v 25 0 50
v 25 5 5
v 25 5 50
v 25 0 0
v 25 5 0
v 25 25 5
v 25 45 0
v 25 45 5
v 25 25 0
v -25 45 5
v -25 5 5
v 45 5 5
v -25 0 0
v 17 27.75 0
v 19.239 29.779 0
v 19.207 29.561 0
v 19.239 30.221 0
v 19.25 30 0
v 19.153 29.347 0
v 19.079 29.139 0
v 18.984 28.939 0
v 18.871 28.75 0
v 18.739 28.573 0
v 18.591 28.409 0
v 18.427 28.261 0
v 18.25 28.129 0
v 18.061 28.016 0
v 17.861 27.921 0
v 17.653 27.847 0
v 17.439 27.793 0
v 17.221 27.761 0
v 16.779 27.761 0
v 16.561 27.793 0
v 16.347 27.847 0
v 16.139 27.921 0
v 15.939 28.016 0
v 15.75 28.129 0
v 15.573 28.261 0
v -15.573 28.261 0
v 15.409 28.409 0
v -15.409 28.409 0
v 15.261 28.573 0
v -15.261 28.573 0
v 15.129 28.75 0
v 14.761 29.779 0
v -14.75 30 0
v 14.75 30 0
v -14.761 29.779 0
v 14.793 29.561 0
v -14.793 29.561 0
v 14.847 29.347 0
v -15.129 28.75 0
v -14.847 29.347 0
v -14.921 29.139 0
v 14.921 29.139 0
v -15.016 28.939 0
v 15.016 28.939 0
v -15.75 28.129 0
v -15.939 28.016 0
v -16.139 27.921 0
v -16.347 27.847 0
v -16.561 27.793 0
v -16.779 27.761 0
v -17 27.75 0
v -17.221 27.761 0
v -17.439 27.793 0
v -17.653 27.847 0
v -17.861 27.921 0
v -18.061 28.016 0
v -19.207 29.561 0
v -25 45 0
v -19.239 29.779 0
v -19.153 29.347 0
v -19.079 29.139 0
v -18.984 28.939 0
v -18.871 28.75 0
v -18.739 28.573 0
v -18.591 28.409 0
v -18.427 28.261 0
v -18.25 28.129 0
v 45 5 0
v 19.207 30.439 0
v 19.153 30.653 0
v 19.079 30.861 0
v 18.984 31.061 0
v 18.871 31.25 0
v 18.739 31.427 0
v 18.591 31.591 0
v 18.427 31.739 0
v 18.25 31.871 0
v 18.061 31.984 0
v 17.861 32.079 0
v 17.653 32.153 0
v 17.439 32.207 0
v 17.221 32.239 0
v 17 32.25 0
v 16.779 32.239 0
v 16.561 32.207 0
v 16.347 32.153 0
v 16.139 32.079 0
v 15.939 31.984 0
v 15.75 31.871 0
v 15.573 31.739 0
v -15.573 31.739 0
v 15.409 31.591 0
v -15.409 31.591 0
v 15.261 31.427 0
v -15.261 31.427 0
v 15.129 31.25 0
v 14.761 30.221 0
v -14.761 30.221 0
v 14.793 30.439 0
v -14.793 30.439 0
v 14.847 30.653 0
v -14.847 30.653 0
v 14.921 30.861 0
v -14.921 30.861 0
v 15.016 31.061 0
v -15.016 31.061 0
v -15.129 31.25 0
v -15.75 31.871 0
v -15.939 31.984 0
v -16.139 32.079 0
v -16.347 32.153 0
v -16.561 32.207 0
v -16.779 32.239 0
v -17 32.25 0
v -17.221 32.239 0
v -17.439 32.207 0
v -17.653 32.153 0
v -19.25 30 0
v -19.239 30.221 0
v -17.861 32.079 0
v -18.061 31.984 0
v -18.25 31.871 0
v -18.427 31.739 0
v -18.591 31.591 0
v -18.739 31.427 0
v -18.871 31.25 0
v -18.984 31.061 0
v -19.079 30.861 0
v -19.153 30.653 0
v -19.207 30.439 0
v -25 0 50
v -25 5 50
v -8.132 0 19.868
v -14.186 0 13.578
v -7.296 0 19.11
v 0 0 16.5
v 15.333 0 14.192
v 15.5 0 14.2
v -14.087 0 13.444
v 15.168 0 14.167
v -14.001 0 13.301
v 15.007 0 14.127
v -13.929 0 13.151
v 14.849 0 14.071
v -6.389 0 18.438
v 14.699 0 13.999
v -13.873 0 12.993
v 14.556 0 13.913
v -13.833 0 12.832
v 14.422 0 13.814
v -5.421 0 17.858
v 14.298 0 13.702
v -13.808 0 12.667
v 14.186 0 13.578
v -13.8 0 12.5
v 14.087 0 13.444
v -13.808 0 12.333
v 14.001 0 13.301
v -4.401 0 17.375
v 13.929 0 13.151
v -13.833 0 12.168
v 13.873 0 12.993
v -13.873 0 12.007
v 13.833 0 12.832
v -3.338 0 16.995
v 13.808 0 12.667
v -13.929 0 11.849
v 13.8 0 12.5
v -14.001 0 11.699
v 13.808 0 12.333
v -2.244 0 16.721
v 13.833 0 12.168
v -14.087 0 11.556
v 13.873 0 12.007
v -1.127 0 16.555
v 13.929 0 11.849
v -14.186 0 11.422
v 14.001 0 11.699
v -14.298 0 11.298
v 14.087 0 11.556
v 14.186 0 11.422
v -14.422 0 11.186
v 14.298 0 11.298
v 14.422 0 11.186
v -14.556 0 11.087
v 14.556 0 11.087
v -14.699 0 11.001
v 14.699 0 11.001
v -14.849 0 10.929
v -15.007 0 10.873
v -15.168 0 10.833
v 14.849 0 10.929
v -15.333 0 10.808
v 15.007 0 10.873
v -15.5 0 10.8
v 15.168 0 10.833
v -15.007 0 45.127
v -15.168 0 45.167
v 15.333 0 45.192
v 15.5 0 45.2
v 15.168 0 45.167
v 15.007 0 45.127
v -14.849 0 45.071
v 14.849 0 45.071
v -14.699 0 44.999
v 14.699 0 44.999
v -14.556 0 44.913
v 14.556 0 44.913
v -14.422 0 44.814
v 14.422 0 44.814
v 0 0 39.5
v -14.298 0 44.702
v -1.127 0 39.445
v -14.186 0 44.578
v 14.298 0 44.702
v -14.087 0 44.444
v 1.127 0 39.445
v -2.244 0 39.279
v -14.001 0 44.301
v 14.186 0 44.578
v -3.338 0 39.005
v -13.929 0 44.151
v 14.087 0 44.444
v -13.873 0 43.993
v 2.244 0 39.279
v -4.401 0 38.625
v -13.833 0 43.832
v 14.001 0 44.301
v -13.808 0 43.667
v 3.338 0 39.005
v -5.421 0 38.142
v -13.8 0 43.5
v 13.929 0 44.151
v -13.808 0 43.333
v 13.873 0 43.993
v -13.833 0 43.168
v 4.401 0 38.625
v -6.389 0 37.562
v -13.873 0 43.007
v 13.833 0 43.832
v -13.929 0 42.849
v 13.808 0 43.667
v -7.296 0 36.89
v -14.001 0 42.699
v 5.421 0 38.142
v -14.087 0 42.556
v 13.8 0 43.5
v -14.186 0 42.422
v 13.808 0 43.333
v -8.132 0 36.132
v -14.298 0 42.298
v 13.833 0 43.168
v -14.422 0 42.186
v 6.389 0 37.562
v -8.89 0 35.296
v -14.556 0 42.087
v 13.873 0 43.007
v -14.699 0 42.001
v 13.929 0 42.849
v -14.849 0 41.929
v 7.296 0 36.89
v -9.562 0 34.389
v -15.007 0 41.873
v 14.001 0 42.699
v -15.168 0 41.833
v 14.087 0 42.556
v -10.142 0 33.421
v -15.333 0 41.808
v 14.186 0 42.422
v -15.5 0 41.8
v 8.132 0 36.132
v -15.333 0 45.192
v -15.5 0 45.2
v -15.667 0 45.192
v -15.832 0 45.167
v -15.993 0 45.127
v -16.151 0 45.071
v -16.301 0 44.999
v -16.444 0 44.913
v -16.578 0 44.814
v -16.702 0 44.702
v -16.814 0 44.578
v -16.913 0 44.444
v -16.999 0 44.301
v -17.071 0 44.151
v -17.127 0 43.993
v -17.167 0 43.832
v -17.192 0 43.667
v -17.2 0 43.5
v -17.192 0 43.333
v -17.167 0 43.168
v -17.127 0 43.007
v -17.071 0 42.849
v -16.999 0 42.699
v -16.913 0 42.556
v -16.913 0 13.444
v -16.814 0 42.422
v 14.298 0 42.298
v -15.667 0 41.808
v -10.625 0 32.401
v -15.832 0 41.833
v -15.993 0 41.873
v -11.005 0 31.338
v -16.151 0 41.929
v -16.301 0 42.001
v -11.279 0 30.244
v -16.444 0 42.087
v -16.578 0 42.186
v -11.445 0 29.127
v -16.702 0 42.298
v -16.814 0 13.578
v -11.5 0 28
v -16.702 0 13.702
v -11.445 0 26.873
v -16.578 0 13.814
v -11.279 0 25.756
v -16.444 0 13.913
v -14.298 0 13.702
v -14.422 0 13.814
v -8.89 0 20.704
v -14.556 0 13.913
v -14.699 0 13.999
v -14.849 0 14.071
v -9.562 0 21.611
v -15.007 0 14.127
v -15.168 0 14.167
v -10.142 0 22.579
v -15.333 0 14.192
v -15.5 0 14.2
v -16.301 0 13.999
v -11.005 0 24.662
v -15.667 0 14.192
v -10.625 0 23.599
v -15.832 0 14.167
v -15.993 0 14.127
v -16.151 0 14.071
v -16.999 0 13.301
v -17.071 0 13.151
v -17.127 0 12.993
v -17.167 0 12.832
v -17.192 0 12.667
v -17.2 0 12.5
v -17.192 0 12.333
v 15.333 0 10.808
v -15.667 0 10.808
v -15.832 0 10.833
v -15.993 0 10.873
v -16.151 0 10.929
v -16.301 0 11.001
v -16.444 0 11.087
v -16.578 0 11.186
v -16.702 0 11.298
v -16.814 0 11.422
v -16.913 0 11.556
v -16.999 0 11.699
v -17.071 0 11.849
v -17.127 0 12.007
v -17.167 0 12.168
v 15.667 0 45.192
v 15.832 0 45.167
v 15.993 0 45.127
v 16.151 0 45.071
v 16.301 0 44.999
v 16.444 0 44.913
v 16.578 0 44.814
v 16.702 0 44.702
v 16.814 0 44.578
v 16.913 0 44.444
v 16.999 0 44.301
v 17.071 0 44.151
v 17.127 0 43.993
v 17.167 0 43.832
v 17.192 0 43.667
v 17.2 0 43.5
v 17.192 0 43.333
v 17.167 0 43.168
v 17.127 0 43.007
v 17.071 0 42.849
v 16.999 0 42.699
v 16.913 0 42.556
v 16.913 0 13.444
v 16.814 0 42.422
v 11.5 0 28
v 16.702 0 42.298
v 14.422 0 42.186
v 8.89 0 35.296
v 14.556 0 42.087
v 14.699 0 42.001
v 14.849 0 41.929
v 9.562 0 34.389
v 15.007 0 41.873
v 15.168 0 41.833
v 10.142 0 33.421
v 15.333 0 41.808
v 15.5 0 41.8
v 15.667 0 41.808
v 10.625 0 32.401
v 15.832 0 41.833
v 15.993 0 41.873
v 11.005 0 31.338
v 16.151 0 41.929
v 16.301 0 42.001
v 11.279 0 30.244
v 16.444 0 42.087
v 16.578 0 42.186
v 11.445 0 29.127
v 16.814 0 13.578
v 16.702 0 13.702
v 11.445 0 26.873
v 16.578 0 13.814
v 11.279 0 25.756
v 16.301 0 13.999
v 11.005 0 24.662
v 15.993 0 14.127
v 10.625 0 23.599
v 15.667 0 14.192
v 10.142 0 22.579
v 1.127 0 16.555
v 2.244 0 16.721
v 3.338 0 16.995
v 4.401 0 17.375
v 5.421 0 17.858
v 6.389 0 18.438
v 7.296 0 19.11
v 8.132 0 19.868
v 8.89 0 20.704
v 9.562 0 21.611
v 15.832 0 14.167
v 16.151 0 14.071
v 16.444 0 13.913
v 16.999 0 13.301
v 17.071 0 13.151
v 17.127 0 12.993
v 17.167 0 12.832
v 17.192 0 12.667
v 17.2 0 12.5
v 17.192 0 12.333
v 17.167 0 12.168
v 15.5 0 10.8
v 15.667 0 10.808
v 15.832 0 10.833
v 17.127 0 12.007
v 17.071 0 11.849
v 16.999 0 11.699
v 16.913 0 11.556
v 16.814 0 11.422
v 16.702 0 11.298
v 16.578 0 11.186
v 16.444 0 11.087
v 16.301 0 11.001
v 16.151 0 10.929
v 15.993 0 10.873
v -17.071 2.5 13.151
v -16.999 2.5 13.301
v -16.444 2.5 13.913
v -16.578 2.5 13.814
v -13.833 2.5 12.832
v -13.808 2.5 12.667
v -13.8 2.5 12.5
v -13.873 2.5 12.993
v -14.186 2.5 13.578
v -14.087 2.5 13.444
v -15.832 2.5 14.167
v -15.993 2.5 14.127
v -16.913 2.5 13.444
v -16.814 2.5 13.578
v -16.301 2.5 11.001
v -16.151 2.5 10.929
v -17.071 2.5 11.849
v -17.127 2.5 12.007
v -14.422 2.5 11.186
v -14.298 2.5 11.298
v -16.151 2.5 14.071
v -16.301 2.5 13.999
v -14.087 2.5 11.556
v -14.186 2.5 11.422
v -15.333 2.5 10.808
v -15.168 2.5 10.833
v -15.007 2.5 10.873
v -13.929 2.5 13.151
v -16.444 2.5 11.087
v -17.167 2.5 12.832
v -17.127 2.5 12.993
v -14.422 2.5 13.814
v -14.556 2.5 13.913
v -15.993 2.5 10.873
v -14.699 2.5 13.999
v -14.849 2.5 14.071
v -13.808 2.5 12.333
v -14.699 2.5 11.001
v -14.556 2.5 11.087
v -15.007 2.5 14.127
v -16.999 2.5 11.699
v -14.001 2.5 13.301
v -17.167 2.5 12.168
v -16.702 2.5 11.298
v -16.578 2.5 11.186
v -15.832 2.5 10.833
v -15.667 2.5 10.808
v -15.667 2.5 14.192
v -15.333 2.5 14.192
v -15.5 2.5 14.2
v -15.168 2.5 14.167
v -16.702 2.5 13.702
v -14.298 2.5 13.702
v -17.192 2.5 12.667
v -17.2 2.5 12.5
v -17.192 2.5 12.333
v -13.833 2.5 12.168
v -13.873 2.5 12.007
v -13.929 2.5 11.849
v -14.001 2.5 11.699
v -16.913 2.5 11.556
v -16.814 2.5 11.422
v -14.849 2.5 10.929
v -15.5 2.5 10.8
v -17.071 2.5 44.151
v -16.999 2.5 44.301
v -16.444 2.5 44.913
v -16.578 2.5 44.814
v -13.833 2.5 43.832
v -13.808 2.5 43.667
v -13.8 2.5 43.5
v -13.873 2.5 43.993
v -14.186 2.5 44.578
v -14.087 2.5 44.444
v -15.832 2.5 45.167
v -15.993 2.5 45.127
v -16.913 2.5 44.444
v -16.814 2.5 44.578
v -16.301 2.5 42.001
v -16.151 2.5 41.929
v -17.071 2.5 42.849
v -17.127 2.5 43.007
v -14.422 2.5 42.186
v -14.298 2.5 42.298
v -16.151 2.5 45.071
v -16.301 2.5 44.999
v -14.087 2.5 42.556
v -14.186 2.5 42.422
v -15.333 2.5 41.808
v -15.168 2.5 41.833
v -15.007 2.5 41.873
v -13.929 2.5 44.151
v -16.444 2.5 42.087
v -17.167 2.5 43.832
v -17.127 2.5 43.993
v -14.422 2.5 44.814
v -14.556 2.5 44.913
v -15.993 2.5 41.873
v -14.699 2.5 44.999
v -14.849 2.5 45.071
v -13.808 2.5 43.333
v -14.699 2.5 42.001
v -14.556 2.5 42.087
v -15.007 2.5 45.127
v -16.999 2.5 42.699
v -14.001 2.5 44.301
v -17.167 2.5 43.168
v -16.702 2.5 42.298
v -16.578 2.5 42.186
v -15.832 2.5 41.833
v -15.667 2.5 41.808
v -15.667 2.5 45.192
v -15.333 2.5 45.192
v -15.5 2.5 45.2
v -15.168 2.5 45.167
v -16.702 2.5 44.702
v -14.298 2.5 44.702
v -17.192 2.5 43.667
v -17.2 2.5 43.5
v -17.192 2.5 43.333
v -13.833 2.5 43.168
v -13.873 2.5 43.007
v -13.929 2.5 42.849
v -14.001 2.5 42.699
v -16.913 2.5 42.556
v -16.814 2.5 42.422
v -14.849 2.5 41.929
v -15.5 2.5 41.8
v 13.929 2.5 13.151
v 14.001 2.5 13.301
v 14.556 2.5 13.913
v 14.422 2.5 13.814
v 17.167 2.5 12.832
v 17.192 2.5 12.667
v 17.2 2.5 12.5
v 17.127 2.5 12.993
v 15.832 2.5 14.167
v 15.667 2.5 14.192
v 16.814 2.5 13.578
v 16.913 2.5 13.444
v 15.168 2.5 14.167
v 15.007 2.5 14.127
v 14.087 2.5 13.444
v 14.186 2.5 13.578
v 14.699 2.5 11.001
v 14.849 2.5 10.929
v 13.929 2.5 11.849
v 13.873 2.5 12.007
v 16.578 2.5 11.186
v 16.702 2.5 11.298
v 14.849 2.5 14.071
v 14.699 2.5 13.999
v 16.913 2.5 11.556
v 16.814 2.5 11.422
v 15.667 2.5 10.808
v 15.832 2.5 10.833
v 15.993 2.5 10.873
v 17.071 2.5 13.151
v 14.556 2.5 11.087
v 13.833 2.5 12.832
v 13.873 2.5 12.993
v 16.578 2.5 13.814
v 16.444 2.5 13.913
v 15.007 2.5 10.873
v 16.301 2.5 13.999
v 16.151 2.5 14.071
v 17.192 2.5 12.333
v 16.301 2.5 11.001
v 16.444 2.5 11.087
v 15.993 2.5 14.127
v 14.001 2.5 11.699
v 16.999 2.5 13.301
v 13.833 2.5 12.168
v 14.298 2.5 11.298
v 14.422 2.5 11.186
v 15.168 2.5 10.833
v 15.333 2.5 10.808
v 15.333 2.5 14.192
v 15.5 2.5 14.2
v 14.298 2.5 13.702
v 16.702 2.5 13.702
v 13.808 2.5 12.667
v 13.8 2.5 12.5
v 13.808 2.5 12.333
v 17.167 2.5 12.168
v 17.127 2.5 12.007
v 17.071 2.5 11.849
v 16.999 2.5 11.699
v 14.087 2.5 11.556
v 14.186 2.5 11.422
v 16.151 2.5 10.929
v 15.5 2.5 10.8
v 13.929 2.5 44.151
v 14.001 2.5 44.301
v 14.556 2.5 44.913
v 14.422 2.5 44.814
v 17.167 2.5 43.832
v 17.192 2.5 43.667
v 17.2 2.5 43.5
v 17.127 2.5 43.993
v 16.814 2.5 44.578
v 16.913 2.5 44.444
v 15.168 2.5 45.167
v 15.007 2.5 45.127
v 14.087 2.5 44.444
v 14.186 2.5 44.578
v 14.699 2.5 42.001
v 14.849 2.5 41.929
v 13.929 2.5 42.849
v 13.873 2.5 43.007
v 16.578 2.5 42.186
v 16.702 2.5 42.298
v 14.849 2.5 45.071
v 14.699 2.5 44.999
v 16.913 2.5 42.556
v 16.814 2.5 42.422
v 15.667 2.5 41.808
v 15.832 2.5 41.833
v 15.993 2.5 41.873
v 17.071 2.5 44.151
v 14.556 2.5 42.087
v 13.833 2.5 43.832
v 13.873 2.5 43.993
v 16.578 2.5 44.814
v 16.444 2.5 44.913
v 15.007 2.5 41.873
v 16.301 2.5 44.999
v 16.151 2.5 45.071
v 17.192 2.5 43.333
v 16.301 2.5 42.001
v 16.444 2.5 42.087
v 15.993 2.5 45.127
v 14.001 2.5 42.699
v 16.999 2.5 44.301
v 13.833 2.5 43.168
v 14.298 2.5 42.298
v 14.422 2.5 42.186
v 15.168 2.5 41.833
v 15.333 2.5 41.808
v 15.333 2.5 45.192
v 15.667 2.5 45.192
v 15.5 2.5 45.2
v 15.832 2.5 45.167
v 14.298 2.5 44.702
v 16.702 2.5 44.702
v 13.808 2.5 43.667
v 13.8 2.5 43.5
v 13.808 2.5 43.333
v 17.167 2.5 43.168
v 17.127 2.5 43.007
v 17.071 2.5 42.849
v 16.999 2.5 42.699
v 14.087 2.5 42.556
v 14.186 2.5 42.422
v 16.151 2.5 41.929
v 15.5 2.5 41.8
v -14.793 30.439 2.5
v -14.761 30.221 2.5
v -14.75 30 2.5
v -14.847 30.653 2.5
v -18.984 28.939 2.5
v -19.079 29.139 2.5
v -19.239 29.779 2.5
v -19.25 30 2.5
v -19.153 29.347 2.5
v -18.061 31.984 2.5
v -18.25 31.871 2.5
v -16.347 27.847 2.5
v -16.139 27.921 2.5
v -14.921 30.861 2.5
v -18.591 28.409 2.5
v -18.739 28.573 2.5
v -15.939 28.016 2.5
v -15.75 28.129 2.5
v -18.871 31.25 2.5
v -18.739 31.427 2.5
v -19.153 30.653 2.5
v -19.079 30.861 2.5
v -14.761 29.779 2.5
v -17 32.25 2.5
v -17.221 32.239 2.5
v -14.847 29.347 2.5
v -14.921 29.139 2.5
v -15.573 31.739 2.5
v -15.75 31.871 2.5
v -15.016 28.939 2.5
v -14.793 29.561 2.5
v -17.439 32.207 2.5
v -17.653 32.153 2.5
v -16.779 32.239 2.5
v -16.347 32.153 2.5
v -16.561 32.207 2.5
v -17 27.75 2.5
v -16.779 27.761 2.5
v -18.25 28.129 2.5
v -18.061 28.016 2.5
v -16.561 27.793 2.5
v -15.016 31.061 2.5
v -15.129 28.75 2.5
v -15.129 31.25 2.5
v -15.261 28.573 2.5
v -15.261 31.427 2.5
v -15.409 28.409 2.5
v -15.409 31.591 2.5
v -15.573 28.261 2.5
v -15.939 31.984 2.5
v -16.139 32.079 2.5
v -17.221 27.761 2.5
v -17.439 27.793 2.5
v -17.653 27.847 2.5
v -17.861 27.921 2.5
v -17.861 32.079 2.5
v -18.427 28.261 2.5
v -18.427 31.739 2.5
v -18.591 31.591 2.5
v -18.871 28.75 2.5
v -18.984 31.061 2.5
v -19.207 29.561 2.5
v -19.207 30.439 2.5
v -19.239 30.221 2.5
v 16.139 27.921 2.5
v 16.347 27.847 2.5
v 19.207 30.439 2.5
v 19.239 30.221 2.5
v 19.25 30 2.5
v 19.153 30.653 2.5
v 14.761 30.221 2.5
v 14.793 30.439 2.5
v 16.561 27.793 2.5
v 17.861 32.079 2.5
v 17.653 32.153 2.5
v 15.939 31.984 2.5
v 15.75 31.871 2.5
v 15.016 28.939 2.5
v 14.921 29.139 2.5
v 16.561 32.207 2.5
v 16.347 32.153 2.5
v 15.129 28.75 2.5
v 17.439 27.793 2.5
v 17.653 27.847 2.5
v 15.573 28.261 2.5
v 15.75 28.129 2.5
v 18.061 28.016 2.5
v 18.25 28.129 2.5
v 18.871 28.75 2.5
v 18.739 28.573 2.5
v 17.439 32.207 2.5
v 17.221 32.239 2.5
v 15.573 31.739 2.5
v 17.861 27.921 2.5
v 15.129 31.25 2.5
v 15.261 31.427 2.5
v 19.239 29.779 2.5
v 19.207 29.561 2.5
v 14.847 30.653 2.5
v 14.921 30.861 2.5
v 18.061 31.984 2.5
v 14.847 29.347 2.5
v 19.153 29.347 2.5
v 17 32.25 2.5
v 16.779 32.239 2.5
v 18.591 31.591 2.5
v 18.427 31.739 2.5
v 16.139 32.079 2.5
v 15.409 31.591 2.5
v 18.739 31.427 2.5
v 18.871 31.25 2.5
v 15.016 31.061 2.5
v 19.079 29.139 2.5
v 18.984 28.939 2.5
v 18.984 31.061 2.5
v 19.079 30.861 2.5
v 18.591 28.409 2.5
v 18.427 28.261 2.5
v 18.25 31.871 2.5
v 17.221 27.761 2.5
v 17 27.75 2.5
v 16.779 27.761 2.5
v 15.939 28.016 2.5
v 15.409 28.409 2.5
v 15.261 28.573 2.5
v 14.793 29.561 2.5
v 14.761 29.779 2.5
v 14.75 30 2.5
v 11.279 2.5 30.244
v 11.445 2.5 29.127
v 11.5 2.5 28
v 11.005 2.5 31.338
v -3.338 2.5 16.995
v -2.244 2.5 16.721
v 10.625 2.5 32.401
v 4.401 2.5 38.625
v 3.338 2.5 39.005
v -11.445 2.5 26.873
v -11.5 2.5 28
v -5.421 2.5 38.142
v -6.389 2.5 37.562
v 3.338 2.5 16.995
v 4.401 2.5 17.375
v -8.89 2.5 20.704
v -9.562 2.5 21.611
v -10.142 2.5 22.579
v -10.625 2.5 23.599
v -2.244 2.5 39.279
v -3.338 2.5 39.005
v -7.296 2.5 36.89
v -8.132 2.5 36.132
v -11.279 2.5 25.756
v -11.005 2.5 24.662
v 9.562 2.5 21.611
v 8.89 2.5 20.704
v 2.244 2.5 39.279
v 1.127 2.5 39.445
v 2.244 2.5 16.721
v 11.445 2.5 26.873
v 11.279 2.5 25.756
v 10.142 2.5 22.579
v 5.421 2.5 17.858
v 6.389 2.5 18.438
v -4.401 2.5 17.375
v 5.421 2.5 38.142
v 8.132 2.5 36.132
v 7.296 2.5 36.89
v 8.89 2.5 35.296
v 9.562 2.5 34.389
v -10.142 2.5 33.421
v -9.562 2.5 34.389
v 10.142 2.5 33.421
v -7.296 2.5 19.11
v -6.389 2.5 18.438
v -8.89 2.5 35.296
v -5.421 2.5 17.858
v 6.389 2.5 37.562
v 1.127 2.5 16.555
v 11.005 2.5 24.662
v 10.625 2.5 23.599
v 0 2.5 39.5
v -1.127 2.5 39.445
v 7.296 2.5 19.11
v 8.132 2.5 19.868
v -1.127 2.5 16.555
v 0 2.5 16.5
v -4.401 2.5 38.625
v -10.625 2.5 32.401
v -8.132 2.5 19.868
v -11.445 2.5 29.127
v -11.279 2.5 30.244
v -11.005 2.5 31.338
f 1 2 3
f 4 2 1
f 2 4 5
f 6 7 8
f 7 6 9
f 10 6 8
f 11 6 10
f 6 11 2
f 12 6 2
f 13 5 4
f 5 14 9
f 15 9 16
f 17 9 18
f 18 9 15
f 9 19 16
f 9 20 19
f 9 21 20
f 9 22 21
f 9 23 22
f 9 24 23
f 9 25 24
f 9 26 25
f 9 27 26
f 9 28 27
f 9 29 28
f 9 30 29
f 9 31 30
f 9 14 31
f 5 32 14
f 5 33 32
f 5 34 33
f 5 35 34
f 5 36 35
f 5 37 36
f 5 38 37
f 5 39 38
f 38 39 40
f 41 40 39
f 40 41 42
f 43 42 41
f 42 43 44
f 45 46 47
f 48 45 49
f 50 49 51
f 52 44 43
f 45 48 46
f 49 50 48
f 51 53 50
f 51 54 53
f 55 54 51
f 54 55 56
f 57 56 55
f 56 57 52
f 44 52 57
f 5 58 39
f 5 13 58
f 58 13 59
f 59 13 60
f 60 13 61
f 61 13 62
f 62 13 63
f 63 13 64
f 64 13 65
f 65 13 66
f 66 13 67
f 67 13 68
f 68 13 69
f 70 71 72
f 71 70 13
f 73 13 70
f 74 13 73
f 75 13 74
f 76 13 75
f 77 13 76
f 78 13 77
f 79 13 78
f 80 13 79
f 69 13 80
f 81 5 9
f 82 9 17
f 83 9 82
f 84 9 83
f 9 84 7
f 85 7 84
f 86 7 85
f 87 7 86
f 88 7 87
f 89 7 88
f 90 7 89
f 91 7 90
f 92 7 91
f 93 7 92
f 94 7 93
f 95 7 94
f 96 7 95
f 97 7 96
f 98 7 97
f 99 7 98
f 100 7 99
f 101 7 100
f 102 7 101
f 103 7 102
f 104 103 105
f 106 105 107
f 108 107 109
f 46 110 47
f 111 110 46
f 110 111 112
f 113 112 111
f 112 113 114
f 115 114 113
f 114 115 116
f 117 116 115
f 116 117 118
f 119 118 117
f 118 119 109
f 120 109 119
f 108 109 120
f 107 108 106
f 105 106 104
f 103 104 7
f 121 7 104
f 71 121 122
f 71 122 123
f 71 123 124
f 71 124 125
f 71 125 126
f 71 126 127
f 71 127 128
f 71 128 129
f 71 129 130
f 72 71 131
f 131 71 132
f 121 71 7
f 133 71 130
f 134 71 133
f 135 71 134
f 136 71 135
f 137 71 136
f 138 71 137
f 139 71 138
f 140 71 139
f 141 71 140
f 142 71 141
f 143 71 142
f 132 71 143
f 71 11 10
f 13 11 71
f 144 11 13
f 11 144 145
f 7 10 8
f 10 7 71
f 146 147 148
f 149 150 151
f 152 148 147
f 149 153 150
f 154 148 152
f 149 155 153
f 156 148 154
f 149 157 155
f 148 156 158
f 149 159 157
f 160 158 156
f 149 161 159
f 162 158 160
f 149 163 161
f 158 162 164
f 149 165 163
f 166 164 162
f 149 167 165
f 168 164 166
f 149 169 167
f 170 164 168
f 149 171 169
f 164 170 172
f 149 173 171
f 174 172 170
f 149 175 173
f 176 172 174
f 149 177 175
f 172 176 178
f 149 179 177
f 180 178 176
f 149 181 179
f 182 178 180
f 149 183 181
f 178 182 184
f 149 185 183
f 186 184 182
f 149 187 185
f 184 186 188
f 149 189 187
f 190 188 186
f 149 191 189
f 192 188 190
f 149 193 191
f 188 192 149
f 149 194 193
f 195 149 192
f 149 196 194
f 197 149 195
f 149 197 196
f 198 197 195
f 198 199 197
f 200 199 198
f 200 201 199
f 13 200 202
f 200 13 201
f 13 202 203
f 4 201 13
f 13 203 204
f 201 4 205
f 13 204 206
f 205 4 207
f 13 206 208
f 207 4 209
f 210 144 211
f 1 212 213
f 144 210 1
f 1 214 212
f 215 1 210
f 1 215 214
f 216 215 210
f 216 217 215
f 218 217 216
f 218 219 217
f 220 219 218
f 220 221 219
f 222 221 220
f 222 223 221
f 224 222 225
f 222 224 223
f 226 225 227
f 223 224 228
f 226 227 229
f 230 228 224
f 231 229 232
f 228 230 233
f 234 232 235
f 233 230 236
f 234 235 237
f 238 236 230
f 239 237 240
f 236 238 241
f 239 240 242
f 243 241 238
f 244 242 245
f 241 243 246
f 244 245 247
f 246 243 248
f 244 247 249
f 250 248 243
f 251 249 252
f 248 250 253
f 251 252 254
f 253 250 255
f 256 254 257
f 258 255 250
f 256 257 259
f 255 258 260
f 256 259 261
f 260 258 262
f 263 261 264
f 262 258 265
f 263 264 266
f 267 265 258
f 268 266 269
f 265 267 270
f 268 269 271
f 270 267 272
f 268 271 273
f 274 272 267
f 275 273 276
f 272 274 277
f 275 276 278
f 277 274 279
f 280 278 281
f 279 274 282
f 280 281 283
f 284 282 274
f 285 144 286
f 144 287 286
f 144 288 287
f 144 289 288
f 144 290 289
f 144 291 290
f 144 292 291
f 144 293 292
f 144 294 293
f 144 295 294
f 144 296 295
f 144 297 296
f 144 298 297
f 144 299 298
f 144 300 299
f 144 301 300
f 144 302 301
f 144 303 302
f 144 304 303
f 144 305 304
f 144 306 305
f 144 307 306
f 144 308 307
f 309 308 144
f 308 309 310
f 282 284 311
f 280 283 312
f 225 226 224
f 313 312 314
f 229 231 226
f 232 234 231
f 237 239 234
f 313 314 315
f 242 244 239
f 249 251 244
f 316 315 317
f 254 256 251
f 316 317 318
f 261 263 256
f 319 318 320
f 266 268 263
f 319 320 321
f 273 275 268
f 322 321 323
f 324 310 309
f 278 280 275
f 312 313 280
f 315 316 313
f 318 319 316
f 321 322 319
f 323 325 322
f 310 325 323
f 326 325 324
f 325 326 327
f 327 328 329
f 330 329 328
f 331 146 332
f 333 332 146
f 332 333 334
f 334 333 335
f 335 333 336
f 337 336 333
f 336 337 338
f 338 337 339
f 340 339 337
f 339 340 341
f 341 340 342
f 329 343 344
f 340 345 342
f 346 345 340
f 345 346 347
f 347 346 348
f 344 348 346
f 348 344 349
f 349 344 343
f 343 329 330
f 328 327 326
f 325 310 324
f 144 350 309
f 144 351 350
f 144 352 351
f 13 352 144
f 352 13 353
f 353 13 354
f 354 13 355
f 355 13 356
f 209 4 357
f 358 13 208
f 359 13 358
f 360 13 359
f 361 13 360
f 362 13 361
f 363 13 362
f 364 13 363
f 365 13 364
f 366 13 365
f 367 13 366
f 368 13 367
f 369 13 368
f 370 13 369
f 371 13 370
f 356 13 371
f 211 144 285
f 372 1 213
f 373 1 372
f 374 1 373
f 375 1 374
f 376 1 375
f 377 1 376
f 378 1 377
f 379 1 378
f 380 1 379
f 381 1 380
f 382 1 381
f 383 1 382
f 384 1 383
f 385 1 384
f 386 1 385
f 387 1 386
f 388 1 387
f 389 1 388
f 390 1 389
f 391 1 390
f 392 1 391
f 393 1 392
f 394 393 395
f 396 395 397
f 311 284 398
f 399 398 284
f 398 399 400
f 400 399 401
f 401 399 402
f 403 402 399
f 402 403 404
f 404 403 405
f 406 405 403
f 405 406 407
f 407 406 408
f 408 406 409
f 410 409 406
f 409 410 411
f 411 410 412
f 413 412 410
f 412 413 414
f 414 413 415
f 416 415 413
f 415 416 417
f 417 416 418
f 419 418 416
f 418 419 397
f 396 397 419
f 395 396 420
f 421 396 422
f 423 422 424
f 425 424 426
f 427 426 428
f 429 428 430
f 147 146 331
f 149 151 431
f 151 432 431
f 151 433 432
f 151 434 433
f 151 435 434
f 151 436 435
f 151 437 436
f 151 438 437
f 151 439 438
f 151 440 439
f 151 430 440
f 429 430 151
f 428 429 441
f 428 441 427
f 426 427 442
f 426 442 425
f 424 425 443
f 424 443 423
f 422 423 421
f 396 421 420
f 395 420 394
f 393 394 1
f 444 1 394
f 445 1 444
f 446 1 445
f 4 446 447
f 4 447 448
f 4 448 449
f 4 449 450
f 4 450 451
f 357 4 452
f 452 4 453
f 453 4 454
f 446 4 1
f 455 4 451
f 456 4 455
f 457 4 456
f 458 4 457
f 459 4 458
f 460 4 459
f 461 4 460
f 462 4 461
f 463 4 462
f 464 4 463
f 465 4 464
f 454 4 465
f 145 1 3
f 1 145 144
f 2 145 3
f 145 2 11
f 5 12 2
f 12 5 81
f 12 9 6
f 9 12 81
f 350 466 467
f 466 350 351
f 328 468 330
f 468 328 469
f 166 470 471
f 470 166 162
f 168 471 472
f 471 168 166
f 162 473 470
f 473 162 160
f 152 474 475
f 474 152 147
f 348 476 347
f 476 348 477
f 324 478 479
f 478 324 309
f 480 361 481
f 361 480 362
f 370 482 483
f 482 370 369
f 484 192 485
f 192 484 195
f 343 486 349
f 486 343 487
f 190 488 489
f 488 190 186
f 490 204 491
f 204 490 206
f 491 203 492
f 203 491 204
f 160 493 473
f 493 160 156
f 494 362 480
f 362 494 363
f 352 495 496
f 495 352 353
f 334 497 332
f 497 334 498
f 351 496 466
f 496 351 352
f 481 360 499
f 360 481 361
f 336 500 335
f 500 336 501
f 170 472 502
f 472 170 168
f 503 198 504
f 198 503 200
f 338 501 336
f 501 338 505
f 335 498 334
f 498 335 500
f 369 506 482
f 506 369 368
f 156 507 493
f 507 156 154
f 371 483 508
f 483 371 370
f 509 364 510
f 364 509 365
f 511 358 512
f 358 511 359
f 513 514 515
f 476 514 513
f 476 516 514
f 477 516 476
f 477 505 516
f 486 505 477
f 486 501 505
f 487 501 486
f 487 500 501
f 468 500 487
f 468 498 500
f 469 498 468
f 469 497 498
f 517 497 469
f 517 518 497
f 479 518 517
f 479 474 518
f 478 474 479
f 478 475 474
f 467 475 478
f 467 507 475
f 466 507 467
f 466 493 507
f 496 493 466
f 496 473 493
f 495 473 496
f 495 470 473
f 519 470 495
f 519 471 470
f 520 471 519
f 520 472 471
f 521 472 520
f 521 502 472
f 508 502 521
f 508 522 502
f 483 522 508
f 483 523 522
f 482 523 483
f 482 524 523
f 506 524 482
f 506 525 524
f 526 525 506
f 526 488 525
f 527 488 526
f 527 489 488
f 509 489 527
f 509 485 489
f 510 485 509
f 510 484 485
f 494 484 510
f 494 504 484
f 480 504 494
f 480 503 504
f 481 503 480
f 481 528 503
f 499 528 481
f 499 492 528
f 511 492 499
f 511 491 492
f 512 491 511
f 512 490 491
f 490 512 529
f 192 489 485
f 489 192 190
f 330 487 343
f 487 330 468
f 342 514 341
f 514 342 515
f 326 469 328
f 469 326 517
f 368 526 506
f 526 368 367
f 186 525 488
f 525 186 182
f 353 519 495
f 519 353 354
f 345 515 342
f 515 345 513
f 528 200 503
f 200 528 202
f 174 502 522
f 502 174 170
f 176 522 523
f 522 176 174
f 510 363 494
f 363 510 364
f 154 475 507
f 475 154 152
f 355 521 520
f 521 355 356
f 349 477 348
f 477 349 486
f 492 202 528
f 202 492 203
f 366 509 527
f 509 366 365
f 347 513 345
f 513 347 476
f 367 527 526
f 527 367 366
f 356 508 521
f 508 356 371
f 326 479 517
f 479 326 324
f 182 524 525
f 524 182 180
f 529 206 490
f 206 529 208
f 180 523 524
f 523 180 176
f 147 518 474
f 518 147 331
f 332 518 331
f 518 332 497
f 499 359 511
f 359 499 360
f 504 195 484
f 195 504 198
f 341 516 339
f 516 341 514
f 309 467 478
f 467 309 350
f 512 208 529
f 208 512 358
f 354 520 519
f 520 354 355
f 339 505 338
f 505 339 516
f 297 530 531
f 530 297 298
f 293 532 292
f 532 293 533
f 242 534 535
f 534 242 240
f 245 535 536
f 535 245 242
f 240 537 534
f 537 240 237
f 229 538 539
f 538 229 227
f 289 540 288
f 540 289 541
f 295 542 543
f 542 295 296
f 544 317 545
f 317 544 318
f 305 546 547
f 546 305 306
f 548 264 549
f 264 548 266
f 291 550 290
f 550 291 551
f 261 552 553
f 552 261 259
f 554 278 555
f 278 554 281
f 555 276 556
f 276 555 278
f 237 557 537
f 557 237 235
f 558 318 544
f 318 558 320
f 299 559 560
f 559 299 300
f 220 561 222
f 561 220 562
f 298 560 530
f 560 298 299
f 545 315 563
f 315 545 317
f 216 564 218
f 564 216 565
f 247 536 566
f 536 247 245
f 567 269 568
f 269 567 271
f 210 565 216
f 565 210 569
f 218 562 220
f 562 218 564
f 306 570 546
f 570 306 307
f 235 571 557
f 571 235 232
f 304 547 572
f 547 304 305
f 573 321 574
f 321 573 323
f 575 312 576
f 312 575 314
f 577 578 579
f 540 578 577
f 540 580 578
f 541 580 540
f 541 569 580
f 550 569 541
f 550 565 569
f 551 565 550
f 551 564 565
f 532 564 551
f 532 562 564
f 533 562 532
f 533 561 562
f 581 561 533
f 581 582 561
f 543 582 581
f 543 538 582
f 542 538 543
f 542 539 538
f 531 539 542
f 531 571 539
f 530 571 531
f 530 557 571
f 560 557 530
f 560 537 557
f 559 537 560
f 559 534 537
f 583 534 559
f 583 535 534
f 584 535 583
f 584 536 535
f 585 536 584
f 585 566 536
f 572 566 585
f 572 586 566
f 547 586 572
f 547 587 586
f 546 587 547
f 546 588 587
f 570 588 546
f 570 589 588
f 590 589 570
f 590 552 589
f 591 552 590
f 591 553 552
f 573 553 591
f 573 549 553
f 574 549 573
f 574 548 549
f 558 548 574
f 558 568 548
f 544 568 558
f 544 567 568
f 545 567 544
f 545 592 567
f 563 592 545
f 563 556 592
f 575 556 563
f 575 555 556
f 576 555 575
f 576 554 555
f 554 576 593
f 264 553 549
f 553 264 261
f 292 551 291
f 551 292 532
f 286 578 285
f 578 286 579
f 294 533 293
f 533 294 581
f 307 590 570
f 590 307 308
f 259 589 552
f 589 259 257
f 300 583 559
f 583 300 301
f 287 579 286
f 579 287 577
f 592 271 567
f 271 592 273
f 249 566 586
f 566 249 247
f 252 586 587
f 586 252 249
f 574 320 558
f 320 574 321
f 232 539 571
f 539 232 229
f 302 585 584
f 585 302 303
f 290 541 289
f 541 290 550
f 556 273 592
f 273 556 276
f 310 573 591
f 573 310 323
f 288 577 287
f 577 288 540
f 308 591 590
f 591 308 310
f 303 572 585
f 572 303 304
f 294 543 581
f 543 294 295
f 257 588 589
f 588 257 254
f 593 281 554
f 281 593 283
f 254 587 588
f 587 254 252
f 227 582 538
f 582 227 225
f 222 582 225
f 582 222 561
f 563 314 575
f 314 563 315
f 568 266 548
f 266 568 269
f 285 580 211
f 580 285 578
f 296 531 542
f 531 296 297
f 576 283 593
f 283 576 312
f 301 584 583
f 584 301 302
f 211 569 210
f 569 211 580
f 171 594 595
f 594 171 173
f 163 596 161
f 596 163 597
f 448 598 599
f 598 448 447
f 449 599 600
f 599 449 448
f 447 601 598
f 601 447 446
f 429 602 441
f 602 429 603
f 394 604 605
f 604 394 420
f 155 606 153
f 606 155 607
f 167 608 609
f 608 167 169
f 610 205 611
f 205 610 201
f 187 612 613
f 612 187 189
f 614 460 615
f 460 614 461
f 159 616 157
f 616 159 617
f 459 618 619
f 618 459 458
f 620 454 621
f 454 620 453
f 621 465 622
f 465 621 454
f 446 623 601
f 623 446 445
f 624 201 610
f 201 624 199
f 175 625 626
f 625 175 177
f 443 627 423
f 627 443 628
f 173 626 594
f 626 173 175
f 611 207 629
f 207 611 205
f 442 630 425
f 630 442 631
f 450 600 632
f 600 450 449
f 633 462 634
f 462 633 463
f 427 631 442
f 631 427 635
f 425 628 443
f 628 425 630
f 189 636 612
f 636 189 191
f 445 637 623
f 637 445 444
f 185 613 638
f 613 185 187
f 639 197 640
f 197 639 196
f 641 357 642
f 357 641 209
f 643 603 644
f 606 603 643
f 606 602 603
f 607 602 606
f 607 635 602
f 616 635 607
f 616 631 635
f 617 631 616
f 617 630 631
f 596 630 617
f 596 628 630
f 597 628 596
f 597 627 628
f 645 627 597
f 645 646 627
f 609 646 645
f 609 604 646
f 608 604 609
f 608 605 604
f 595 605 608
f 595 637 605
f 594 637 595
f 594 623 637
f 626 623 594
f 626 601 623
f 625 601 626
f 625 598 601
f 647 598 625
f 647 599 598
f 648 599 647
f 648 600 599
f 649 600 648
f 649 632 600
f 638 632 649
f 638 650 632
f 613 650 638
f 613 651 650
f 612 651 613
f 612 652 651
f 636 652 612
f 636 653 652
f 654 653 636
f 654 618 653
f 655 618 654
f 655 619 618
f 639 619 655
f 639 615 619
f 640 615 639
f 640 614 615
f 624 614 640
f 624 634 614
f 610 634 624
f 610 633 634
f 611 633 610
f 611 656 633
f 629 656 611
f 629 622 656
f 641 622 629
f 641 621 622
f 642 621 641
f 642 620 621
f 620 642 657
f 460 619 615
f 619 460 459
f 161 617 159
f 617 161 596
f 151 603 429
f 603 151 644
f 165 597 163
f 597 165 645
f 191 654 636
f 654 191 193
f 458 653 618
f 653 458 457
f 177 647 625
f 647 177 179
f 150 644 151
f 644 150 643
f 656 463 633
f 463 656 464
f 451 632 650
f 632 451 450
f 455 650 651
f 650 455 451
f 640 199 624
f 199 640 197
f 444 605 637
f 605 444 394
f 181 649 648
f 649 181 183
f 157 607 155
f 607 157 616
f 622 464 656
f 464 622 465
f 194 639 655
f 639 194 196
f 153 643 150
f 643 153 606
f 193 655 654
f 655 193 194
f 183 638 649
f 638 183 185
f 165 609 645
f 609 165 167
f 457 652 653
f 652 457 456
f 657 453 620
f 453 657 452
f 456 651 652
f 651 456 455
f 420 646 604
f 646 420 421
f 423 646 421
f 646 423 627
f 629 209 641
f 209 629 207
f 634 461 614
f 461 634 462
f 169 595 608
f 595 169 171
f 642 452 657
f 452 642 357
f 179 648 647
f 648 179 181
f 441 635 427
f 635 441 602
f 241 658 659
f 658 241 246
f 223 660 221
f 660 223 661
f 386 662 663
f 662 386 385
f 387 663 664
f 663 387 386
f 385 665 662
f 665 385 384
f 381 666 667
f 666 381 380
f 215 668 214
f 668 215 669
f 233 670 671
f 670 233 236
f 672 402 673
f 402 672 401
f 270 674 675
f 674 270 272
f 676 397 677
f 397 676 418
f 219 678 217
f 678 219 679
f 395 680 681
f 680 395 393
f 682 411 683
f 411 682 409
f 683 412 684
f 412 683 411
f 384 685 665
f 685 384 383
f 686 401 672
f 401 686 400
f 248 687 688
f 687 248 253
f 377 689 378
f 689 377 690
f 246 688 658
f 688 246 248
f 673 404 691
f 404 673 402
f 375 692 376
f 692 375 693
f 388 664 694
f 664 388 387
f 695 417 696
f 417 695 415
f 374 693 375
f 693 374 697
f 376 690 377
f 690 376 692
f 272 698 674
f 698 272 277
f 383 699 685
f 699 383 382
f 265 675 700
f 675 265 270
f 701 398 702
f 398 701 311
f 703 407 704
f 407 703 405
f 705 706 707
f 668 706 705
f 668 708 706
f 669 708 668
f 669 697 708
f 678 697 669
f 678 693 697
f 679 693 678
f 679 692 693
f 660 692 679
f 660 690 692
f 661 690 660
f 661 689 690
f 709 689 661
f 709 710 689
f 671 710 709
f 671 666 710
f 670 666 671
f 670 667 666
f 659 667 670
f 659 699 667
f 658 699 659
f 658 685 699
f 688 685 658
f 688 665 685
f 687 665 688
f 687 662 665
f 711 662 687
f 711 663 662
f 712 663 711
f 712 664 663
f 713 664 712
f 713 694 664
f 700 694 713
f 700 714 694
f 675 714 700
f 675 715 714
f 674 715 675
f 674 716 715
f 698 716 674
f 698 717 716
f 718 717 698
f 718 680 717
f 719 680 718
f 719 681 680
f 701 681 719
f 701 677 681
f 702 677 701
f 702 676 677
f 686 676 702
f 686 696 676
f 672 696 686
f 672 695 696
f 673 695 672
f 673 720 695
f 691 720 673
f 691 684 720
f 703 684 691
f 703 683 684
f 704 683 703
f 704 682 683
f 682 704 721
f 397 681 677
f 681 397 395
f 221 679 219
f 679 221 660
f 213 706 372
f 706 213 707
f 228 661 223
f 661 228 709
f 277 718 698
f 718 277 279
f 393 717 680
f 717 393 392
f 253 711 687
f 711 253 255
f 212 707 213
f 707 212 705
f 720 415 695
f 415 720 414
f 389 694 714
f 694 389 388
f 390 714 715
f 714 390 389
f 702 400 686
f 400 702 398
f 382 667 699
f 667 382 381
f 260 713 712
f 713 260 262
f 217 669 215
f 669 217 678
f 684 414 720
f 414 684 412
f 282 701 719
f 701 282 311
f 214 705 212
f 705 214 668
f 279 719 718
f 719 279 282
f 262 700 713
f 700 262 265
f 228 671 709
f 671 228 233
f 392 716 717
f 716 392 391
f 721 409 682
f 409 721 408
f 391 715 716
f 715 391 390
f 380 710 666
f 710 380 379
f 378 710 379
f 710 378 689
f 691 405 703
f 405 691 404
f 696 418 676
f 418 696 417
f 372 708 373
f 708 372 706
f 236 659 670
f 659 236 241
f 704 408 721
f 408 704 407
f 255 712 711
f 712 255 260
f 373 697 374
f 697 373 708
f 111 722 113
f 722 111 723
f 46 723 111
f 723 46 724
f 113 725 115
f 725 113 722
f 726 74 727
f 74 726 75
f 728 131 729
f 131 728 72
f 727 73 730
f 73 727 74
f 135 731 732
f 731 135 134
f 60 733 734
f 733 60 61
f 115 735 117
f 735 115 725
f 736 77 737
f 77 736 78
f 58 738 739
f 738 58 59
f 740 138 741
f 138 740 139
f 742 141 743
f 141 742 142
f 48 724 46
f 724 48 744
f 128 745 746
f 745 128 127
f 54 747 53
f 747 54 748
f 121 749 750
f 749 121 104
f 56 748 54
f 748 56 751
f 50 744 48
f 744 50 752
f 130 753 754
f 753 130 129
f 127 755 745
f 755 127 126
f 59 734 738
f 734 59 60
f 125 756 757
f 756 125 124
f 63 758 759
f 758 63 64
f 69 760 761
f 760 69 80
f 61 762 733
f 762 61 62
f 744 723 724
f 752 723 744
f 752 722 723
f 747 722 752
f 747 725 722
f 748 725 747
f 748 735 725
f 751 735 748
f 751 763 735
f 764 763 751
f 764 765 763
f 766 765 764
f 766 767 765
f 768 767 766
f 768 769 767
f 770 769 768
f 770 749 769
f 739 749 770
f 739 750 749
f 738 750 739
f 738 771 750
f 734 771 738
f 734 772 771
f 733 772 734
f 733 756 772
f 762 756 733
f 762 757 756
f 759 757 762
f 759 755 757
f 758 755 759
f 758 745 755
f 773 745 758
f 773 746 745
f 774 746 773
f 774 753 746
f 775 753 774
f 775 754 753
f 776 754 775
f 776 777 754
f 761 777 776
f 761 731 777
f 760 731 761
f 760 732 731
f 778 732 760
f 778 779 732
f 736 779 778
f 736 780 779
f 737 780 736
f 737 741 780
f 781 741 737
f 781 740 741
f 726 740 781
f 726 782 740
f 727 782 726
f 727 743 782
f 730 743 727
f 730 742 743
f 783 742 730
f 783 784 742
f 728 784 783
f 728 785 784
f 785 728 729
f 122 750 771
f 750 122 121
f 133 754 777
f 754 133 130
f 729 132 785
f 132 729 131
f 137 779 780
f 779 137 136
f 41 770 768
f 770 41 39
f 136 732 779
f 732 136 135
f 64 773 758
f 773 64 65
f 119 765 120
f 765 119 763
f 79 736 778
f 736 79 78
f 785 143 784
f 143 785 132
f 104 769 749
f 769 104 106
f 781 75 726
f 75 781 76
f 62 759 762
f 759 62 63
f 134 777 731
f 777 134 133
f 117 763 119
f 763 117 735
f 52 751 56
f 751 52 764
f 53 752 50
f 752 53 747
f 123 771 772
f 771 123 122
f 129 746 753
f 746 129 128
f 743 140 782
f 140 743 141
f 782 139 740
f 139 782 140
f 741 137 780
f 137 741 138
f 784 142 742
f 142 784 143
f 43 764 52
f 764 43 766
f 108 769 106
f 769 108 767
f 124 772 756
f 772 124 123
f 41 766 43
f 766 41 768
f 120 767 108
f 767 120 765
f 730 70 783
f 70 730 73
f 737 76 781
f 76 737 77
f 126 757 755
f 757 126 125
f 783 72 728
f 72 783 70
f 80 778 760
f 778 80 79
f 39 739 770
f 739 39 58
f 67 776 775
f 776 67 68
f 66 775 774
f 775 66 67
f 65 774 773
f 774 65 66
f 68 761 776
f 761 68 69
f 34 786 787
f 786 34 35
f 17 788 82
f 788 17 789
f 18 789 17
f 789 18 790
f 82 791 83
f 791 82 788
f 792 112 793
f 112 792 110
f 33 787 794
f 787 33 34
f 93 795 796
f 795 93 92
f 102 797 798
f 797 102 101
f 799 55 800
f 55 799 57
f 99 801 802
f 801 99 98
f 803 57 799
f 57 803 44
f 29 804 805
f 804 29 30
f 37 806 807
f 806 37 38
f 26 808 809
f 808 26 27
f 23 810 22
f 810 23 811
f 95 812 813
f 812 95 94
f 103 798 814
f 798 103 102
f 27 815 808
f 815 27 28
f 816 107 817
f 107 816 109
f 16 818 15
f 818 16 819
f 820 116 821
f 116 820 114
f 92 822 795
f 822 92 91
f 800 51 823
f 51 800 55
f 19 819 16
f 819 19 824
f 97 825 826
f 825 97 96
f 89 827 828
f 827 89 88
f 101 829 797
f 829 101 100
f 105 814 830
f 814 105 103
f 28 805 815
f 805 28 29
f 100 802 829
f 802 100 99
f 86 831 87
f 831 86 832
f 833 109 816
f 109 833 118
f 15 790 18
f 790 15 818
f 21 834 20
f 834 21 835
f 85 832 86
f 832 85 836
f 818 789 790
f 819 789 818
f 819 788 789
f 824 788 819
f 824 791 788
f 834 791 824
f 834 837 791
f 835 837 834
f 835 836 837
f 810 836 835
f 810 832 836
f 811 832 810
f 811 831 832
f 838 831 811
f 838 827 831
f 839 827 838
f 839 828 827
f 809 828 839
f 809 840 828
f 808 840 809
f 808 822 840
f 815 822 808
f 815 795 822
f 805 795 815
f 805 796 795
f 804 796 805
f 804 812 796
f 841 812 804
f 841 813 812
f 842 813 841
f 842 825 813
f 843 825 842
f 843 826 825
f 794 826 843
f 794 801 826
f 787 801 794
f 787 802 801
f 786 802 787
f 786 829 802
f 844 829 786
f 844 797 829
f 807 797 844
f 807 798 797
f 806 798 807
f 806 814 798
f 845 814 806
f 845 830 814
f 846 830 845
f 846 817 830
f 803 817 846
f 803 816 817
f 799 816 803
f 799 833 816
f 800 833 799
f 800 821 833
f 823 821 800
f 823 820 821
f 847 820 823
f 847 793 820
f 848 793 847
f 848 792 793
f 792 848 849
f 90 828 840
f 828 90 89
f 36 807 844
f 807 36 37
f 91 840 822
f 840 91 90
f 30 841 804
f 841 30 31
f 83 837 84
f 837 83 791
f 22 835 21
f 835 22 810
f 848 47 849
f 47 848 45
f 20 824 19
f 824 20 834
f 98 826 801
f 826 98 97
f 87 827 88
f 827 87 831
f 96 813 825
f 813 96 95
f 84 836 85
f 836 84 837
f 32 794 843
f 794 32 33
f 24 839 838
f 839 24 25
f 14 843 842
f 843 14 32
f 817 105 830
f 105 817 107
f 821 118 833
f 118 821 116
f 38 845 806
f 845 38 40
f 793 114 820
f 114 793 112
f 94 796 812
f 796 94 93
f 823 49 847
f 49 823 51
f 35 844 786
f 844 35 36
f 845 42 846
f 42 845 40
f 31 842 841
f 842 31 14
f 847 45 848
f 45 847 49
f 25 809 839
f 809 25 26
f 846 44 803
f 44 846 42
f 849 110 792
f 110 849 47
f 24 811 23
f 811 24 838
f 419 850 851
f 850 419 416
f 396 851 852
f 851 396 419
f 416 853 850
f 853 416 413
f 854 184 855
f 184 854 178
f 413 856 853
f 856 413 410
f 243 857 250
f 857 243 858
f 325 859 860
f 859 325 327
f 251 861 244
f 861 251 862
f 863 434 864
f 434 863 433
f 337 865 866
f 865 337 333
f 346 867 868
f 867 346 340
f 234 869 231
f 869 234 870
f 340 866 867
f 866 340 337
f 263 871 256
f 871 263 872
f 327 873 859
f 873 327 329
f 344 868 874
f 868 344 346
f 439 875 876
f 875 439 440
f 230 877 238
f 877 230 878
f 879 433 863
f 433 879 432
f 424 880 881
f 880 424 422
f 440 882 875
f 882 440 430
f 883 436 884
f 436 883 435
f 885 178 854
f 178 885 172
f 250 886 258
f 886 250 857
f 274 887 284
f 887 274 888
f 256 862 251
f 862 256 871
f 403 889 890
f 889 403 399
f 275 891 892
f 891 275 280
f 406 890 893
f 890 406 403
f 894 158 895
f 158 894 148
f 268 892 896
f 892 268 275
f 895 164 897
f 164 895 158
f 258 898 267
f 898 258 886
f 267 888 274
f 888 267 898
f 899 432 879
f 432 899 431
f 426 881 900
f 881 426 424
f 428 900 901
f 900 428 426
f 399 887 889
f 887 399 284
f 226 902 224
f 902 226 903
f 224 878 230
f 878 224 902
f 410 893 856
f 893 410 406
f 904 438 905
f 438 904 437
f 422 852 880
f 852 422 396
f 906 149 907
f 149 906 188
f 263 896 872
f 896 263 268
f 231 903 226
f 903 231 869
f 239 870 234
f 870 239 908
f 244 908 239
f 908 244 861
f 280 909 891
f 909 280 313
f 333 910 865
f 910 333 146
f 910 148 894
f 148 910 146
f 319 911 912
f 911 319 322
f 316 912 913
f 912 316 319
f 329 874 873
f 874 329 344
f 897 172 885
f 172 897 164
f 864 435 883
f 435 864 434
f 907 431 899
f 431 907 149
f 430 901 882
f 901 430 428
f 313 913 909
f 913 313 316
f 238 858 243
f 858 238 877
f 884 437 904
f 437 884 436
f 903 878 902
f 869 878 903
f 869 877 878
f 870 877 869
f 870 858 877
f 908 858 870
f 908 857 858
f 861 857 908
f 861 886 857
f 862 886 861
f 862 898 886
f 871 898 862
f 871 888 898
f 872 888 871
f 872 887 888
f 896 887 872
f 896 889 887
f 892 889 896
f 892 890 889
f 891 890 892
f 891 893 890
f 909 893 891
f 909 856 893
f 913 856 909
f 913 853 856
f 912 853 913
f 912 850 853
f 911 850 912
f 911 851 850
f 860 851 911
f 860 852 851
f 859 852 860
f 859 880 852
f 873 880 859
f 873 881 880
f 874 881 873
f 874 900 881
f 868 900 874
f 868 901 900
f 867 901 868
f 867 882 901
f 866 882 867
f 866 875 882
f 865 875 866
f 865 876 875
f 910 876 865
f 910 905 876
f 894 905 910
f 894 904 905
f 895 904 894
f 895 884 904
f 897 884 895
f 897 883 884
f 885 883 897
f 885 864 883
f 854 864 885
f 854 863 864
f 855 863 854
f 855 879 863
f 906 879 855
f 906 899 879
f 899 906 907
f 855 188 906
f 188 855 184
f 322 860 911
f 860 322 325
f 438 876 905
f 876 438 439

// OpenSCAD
// L-shaped NEMA 17 Mounting Bracket for Syringe Pump
// Print orientation: Base on bed (XY plane), building up +Z.

// --- Dimensions ---
// Base Plate
base_x = 50;          // Total width (x from -25 to 25)
base_y = 45;          // Total depth (y from 0 to 45)
base_z = 5;           // Thickness

// Vertical Motor Plate
motor_plate_x = 50;   // Total width (x from -25 to 25)
motor_plate_y = 5;    // Thickness (y from 0 to 5)
motor_plate_z = 50;   // Height (z from 0 to 50)

// Base Holes (M4)
base_hole_dia = 4.5;
base_hole_offset_x = 17;
base_hole_offset_y = 30;

// Motor Plate Holes
boss_hole_dia = 23;
boss_hole_z = 28;     // Center height of boss hole

m3_hole_dia = 3.4;
m3_pattern_size = 31; // Square pattern size
m3_pattern_z = 28;    // Center height of M3 pattern

// Gussets
gusset_thickness = 5;
gusset_leg = 20;      // Length of triangle legs
gusset_x_start = 20;  // Gussets are at x=20..25 and x=-25..-20

// --- Rendering Settings ---
$fn = 64;

// --- Main Structure ---
difference() {
    union() {
        // 1. Base Plate
        // Spec: x from -25 to 25, y from 0 to 45, z from 0 to 5
        // Centered at x=0, y=base_y/2, z=base_z/2
        translate([-base_x/2, 0, 0])
            cube([base_x, base_y, base_z]);

        // 2. Vertical Motor Plate
        // Spec: x from -25 to 25, y from 0 to 5, z from 0 to 50
        // Stands on the back edge of the base (y=0 to y=5)
        translate([-motor_plate_x/2, 0, 0])
            cube([motor_plate_x, motor_plate_y, motor_plate_z]);

        // 3. Left Gusset
        // Right triangle in YZ plane, right angle at (y=5, z=5)
        // Legs go +Y (to 25) and +Z (to 25)
        // Located at x = -25 to -20
        translate([-25, 0, 0])
            linear_extrude(height = 5, convexity = 10)
            polygon(points = [[5,5], [25,5], [5,25]], paths = [[0,1,2]]);

        // 4. Right Gusset
        // Located at x = 20 to 25
        translate([20, 0, 0])
            linear_extrude(height = 5, convexity = 10)
            polygon(points = [[5,5], [25,5], [5,25]], paths = [[0,1,2]]);
    }

    // --- Cuts ---

    // 1. Base Plate Holes (M4)
    // Hole 1: x = -17, y = 30
    translate([-17, 30, -0.1])
        cylinder(h = base_z + 0.2, r = base_hole_dia/2, center = true);

    // Hole 2: x = 17, y = 30
    translate([17, 30, -0.1])
        cylinder(h = base_z + 0.2, r = base_hole_dia/2, center = true);

    // 2. Motor Plate Boss Hole (23mm)
    // Center at x=0, z=28. Cuts through Y (thickness 5).
    // Cylinder axis along Y.
    translate([0, -0.1, boss_hole_z])
        rotate([90, 0, 0])
        cylinder(h = motor_plate_y + 0.2, r = boss_hole_dia/2, center = true);

    // 3. Motor Plate M3 Holes (31mm square pattern)
    // Center at x=0, z=28.
    // Pattern corners: x = +/- 15.5, z = 28 +/- 15.5
    for (dx = [-15.5, 15.5]) {
        for (dz = [-15.5, 15.5]) {
            translate([dx, -0.1, m3_pattern_z + dz])
                rotate([90, 0, 0])
                cylinder(h = motor_plate_y + 0.2, r = m3_hole_dia/2, center = true);
        }
    }
}
